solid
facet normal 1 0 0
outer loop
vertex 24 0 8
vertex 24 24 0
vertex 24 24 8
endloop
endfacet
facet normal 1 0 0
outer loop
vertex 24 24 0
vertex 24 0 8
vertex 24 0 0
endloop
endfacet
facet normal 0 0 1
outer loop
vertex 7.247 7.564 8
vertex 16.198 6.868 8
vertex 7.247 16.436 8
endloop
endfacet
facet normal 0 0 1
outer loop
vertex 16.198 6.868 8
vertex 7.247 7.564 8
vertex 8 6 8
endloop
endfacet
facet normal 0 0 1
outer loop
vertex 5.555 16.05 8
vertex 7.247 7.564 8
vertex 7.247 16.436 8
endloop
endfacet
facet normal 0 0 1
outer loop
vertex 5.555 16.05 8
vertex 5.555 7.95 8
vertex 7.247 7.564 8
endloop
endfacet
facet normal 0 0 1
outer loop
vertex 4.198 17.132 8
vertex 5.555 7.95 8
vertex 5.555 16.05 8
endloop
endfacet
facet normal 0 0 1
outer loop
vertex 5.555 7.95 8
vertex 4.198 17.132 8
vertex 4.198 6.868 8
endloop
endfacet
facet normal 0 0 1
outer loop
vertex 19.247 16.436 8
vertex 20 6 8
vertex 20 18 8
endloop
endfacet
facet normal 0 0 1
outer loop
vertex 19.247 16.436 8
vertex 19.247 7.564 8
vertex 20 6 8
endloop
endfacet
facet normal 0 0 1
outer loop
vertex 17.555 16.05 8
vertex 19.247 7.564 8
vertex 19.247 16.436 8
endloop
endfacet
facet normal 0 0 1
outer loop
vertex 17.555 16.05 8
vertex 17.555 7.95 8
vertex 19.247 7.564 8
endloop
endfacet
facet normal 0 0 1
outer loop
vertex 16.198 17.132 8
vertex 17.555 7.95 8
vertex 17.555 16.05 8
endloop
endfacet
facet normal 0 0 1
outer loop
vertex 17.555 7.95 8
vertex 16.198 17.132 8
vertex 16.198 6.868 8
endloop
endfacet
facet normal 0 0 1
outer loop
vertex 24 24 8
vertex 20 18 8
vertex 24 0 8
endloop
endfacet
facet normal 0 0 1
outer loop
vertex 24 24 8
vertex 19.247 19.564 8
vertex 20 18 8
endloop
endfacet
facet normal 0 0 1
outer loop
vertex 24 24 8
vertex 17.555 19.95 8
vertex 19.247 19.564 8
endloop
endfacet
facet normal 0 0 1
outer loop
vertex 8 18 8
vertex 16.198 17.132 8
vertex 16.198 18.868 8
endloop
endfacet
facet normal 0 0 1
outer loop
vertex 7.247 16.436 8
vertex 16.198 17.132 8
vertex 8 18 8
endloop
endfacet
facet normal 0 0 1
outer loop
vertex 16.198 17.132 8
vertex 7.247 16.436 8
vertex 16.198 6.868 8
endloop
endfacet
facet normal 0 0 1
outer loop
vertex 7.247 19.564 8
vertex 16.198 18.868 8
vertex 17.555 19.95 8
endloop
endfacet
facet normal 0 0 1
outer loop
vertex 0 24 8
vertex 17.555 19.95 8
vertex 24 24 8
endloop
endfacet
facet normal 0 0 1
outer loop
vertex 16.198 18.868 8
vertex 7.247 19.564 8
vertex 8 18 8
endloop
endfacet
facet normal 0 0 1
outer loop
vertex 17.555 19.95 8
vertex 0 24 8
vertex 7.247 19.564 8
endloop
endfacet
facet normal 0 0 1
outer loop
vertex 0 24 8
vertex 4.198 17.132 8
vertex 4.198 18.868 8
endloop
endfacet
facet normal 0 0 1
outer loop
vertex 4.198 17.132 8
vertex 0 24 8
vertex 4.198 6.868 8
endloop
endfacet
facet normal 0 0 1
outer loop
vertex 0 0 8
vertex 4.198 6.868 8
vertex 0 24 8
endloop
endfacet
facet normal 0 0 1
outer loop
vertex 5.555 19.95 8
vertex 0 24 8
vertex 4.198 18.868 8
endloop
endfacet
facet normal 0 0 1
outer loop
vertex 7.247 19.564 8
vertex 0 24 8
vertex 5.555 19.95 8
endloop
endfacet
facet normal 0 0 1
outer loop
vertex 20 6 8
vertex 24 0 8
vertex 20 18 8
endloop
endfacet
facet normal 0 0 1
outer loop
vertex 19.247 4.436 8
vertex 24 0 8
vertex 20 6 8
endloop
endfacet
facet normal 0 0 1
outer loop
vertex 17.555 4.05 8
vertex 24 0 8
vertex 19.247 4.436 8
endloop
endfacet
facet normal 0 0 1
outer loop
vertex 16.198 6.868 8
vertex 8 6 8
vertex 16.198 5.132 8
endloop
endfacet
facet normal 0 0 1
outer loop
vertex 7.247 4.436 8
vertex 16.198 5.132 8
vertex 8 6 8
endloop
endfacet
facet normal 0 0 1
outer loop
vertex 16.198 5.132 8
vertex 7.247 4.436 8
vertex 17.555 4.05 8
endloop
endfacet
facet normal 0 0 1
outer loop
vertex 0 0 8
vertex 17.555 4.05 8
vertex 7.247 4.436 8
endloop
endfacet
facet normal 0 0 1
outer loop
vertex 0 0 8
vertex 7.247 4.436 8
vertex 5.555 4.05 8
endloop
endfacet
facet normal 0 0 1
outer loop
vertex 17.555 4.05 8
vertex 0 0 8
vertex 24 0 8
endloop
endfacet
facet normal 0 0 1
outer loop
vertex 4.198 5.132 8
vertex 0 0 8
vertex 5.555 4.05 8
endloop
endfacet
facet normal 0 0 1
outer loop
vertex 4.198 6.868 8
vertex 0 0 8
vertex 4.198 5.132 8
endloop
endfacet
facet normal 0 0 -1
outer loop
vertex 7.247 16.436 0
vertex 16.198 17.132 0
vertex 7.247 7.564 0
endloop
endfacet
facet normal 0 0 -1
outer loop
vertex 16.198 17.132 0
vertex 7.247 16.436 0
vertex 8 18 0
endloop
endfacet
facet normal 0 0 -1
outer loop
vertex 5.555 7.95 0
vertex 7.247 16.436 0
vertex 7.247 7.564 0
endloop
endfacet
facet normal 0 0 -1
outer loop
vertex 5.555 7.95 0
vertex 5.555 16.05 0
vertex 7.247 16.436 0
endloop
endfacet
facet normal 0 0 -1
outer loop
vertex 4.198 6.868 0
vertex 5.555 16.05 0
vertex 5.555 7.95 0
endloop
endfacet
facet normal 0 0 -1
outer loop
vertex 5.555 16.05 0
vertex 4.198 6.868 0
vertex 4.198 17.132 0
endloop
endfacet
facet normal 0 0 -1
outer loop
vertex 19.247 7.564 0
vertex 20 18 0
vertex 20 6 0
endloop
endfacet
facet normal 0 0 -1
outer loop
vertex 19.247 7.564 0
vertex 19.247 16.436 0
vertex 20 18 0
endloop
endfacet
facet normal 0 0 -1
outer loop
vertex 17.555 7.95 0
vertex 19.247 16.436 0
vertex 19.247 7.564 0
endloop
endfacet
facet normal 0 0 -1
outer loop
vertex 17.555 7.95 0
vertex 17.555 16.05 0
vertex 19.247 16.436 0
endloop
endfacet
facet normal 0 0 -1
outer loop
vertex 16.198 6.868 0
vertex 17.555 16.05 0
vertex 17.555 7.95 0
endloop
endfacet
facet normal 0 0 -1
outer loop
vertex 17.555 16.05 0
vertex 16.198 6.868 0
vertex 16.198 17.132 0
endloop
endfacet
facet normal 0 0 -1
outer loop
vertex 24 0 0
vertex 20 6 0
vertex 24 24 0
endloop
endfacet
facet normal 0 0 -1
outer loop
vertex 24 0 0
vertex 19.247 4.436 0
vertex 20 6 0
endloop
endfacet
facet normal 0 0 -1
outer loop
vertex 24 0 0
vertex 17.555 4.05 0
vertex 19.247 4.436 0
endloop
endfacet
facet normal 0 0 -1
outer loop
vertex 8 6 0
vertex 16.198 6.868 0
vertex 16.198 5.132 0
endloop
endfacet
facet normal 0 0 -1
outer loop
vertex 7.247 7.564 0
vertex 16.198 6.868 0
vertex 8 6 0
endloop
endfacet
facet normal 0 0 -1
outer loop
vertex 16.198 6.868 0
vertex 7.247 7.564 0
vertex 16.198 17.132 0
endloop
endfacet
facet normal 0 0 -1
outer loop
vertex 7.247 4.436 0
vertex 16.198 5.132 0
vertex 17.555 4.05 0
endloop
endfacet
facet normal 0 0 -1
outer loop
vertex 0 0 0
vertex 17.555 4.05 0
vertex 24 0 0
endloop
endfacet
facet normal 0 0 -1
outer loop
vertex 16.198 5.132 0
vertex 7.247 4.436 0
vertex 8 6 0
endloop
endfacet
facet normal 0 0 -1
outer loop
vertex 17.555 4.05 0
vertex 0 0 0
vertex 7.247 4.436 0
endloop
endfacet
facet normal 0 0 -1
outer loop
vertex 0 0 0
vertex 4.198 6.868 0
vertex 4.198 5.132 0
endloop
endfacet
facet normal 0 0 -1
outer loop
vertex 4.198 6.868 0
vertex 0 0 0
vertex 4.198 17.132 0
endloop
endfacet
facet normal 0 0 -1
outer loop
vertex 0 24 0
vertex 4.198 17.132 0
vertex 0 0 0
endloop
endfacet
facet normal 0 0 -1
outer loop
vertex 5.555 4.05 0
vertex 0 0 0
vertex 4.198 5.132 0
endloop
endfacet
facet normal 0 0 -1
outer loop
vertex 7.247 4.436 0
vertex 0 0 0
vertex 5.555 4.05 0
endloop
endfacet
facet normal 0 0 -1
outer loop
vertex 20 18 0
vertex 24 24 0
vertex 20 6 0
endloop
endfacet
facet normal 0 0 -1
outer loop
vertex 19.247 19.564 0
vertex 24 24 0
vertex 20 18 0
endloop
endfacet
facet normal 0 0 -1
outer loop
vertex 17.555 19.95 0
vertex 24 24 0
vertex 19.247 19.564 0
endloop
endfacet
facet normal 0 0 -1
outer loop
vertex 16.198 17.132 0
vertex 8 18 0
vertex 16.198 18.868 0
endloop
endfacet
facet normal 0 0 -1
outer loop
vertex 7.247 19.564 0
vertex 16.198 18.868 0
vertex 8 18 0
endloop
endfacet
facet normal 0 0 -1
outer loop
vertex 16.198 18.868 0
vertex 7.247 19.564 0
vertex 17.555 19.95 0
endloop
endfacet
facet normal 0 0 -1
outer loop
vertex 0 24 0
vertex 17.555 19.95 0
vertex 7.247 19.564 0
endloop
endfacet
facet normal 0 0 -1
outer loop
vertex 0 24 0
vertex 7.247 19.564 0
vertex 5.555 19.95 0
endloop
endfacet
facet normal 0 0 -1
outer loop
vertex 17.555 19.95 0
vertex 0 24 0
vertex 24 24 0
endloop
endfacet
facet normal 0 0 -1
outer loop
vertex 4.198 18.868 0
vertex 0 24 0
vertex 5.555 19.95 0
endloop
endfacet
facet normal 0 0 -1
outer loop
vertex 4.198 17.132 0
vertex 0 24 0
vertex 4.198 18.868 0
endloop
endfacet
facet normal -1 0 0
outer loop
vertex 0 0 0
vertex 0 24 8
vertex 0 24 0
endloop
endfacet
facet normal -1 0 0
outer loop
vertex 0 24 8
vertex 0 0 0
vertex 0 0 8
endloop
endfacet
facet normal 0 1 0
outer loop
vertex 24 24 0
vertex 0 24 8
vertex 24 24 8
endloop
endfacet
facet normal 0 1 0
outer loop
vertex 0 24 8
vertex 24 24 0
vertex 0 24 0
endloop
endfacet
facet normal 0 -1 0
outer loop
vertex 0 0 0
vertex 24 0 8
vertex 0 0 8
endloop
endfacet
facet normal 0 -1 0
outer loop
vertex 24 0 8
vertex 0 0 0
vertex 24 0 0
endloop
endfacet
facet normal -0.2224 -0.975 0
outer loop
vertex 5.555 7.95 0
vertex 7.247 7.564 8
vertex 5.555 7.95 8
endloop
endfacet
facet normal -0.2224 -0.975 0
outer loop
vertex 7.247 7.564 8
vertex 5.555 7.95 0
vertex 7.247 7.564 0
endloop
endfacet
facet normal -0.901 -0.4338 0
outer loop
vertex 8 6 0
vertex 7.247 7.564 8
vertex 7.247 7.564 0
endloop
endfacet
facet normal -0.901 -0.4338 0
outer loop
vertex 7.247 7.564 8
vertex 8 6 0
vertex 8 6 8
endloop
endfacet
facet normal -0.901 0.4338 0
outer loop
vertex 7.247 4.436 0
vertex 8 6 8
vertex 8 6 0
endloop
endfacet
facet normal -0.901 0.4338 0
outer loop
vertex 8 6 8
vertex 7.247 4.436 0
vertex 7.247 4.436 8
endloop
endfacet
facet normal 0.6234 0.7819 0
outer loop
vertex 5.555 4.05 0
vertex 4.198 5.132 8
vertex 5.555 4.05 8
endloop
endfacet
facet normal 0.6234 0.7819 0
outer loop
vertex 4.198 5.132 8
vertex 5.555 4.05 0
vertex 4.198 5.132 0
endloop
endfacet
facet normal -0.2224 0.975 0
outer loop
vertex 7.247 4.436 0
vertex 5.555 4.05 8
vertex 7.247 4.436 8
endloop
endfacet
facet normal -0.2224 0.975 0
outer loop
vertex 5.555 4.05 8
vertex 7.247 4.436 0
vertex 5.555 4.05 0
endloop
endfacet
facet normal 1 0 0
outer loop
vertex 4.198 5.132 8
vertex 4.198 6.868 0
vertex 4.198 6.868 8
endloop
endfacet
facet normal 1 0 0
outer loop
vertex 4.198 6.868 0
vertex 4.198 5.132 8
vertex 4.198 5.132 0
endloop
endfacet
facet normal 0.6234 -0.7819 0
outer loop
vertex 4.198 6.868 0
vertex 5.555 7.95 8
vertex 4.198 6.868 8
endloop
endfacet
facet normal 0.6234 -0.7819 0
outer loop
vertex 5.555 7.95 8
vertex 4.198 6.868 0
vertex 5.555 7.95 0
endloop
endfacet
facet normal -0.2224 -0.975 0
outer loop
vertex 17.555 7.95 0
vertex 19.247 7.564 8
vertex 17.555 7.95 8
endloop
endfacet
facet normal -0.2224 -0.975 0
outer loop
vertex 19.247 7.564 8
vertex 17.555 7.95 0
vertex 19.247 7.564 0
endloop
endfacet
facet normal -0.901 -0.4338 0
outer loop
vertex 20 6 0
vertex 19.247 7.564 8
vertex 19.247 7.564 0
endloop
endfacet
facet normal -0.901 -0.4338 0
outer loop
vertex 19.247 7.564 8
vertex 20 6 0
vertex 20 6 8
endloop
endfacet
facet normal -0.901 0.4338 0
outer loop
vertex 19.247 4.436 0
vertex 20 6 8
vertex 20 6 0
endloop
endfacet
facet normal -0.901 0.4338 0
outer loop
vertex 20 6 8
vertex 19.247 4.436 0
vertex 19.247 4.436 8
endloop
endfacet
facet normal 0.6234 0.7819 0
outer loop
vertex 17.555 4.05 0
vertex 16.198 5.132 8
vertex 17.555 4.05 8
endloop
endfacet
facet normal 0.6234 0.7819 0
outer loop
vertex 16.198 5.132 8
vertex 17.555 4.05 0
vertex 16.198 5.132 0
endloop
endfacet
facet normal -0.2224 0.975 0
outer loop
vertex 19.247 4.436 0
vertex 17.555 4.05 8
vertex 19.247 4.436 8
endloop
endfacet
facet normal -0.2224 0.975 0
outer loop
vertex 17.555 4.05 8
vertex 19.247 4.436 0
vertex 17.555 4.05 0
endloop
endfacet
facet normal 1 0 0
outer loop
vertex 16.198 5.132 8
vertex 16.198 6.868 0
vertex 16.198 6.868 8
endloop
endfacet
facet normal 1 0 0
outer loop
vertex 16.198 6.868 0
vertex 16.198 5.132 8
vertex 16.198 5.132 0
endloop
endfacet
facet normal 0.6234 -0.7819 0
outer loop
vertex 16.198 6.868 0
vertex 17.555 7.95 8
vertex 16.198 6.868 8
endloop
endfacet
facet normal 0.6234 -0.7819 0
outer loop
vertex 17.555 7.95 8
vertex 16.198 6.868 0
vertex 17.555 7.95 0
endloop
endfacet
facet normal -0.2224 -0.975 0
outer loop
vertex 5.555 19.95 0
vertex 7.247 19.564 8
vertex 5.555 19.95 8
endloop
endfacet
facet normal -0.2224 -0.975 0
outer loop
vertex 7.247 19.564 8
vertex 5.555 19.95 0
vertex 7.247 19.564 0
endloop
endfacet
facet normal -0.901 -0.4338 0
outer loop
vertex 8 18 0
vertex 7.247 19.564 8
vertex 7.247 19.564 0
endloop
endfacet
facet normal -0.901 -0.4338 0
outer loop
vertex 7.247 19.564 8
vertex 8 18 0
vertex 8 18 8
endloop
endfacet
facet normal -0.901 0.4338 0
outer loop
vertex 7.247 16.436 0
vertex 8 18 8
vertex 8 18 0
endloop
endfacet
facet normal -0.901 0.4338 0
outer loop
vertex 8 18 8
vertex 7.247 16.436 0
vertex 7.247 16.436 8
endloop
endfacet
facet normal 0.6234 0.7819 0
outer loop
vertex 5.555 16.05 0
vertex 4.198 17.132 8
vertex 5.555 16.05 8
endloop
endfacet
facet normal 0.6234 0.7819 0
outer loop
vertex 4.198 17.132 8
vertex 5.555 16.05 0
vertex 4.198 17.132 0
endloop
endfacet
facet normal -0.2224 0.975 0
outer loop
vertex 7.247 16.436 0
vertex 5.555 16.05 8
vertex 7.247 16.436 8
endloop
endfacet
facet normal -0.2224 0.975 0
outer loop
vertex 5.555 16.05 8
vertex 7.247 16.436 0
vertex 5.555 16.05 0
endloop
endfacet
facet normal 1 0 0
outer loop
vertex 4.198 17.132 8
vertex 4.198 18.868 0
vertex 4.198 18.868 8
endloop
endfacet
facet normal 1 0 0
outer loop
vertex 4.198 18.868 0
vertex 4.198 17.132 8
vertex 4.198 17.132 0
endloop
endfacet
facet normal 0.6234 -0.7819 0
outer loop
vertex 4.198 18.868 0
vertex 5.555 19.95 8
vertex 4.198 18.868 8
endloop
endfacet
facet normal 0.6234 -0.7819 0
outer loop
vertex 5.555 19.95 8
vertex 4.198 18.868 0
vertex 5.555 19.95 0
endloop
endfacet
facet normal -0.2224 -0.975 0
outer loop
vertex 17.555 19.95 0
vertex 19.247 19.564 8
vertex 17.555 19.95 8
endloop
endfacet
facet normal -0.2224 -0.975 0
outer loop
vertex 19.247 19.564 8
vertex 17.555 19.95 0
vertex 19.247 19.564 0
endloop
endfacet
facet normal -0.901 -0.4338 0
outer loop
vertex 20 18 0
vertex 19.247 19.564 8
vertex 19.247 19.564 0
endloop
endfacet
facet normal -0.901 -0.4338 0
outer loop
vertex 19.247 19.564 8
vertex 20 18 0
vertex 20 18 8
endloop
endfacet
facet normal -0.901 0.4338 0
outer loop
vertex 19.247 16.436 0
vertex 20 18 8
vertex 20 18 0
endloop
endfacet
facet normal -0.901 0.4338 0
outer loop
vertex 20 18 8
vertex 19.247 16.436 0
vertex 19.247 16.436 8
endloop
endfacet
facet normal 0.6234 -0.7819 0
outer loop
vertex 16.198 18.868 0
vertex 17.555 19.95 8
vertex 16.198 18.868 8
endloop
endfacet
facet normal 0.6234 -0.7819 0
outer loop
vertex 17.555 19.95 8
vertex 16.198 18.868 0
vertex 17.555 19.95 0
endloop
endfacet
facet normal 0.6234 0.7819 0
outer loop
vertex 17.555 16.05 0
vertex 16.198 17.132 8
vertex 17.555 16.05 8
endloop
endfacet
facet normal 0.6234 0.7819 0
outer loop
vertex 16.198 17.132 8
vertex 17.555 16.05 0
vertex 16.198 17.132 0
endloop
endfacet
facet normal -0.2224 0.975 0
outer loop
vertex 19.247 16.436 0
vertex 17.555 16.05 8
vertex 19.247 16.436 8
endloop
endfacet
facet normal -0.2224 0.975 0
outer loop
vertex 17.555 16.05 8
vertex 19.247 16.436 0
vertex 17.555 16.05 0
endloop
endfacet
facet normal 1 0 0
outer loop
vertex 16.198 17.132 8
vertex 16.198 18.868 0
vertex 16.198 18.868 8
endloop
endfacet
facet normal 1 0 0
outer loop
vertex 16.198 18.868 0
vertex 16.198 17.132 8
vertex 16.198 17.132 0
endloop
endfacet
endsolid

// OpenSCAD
// 
/*
 *  Circuit Board Spacer
 *  by Timothy Schmidt.
 *
 *  This program is free software; you can redistribute it and/or modify
 *  it under the terms of the GNU General Public License as published by
 *  the Free Software Foundation; either version 2 of the License, or
 *  (at your option) any later version.
 *
 *  This program is distributed in the hope that it will be useful,
 *  but WITHOUT ANY WARRANTY; without even the implied warranty of
 *  MERCHANTABILITY or FITNESS FOR A PARTICULAR PURPOSE.  See the
 *  GNU General Public License for more details.
 *
 *  You should have received a copy of the GNU General Public License
 *  along with this program; if not, write to the Free Software
 *  Foundation, Inc., 59 Temple Place, Suite 330, Boston, MA  02111-1307  USA
 *
*/

difference () {
	cube(size=[24,24,8]);
	translate(v=[6,6,-1]) cylinder(r=2,h=10);
	translate(v=[18,6,-1]) cylinder(r=2,h=10);
	translate(v=[6,18,-1]) cylinder(r=2,h=10);
	translate(v=[18,18,-1]) cylinder(r=2,h=10);
}
